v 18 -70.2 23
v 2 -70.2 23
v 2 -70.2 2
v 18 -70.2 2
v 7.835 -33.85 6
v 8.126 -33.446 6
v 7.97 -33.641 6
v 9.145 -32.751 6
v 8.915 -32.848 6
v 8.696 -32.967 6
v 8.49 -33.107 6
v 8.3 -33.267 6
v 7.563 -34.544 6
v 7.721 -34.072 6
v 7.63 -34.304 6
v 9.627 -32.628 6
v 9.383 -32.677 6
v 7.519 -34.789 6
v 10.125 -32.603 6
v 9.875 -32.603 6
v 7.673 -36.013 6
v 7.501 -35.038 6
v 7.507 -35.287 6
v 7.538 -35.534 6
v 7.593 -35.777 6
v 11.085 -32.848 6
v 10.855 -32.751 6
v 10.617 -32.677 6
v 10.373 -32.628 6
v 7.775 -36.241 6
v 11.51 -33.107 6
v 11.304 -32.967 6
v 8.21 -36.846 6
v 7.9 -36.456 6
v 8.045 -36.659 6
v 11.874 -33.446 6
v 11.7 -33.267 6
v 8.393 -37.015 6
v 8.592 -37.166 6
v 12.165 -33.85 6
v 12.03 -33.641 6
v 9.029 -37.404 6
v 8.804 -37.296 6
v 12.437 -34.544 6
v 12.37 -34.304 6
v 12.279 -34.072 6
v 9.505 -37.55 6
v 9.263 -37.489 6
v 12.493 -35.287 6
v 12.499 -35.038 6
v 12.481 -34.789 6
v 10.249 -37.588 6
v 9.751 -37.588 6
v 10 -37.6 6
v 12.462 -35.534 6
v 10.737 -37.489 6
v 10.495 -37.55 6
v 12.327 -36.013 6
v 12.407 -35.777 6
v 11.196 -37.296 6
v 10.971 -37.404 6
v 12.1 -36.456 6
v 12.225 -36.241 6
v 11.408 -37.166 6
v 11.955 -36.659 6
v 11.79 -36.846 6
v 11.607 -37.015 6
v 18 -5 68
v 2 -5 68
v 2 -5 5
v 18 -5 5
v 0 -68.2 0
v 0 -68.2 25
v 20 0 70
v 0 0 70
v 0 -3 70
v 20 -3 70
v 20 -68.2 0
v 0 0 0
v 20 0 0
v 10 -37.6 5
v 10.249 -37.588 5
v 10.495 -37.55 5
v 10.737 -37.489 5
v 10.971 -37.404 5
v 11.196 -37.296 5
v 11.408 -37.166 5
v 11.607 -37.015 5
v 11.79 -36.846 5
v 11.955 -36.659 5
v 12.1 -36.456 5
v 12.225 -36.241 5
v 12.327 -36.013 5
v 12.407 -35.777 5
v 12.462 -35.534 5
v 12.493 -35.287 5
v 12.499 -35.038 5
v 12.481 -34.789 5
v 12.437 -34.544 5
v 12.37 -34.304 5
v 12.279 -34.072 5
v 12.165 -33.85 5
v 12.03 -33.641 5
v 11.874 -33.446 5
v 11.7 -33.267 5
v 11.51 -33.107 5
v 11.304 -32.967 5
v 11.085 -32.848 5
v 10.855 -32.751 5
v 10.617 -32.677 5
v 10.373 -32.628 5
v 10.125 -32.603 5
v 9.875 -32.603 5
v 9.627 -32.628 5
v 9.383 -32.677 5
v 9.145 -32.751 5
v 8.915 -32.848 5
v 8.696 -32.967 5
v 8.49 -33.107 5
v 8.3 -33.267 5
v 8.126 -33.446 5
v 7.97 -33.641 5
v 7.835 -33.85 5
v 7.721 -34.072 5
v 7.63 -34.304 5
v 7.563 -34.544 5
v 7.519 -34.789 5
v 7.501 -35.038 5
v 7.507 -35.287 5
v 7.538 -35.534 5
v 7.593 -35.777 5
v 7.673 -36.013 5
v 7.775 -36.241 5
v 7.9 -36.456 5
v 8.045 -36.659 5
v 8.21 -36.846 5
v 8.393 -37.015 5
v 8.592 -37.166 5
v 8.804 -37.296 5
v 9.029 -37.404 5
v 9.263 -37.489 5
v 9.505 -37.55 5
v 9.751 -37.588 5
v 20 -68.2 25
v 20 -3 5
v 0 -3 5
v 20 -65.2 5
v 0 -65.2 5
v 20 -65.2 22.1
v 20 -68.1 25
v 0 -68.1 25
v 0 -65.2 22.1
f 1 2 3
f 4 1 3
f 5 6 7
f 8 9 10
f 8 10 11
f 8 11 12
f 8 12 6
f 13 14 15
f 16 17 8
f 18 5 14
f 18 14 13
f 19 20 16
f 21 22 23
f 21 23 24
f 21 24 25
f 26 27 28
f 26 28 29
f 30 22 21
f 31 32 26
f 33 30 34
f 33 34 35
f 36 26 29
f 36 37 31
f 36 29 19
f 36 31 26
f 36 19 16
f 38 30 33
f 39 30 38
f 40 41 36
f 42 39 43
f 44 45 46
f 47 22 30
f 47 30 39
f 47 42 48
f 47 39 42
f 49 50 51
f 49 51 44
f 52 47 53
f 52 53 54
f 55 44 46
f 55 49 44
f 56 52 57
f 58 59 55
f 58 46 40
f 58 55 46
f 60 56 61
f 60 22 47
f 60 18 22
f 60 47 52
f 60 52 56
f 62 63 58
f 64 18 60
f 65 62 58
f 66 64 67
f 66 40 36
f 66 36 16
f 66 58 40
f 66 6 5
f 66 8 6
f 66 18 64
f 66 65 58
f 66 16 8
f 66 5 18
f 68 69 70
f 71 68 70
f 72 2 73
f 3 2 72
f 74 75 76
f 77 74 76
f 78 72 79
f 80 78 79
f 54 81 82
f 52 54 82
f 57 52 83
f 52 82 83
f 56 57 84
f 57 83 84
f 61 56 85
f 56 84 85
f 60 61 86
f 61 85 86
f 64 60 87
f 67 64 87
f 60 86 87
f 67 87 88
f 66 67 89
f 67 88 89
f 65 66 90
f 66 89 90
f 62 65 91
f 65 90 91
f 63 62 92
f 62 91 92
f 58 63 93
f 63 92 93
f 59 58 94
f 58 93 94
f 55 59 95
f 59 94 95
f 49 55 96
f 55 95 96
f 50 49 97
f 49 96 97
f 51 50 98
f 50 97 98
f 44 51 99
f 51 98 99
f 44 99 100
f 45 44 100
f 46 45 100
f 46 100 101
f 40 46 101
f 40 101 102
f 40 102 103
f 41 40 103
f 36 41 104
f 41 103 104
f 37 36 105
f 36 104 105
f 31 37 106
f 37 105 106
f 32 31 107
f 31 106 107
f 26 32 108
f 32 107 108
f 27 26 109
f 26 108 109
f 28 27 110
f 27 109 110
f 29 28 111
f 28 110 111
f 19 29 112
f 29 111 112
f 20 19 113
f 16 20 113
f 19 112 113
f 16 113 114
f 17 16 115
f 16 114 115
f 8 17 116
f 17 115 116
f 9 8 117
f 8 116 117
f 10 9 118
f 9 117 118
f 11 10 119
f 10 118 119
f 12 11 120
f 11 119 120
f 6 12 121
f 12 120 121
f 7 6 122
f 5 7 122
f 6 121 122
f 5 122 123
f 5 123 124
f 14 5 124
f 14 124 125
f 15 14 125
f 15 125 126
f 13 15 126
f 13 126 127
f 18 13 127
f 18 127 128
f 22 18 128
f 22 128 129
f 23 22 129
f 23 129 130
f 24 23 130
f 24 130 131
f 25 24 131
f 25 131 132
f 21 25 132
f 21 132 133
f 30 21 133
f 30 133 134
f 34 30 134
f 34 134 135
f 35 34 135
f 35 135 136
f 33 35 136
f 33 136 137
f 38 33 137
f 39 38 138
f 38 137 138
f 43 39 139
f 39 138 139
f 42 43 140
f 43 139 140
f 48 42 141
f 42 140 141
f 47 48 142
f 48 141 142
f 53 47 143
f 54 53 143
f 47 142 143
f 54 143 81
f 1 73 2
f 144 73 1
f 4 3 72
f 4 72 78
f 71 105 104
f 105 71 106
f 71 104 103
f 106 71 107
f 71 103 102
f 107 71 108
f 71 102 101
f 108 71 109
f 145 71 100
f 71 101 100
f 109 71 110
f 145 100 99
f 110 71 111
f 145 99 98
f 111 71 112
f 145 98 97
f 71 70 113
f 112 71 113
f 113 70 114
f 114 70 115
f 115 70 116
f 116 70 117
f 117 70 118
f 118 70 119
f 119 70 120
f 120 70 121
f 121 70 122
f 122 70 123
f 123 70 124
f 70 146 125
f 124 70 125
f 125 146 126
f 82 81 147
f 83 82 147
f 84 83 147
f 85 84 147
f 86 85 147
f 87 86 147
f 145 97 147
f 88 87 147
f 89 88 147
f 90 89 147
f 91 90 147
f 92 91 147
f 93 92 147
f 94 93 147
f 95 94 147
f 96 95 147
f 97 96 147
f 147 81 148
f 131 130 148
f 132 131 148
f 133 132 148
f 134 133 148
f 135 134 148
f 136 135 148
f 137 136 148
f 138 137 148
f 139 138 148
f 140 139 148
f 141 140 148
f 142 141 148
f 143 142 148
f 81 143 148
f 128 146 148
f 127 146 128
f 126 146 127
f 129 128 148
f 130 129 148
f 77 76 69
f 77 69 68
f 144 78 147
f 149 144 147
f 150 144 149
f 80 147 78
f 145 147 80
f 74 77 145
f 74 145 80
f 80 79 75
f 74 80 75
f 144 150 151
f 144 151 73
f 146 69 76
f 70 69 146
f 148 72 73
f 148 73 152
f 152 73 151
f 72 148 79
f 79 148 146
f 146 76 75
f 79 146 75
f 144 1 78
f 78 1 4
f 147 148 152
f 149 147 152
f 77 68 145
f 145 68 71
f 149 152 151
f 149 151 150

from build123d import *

# Parameters (mm, degrees)
PAD012_DEPTH    = 20
SKETCH024_R     = 2.5
PAD013_DEPTH    = 1
CHAMFER005_SIZE = 2
CHAMFER006_SIZE = 2
CHAMFER007_SIZE = 2.9


with BuildPart() as part:
    # Sketch023 → Pad012 (new body)
    with BuildSketch(Plane.YZ):
        Polygon((0, 0), (0, 70), (-5, 70), (-5, 5), (-65.2, 5), (-65.2, 25), (-70.2, 25), (-70.2, 0), align=None)
    extrude(amount=PAD012_DEPTH)

    # Sketch024 (on Face8 of Pad012) → Pad013 (join)
    with BuildSketch(Plane(origin=(0, 0, 5), x_dir=(0, -1, 0), z_dir=(0, 0, 1))):
        with Locations((35.1, 10)):
            Circle(SKETCH024_R)
    extrude(amount=PAD013_DEPTH)

    # Chamfer005
    chamfer005_edges = [part.edges().sort_by_distance(p)[0] for p in [
        (10, -70.2, 25),
        (20, -70.2, 12.5),
        (0, -70.2, 12.5),
        (10, -70.2, 0),
    ]]
    chamfer(chamfer005_edges, length=CHAMFER005_SIZE)

    # Chamfer006
    chamfer006_edges = [part.edges().sort_by_distance(p)[0] for p in [
        (20, -5, 37.5),
        (10, -5, 70),
        (0, -5, 37.5),
    ]]
    chamfer(chamfer006_edges, length=CHAMFER006_SIZE)

    # Chamfer007
    chamfer007_edges = [part.edges().sort_by_distance(p)[0] for p in [
        (10, -65.2, 25),
    ]]
    chamfer(chamfer007_edges, length=CHAMFER007_SIZE)


solid = part.part
